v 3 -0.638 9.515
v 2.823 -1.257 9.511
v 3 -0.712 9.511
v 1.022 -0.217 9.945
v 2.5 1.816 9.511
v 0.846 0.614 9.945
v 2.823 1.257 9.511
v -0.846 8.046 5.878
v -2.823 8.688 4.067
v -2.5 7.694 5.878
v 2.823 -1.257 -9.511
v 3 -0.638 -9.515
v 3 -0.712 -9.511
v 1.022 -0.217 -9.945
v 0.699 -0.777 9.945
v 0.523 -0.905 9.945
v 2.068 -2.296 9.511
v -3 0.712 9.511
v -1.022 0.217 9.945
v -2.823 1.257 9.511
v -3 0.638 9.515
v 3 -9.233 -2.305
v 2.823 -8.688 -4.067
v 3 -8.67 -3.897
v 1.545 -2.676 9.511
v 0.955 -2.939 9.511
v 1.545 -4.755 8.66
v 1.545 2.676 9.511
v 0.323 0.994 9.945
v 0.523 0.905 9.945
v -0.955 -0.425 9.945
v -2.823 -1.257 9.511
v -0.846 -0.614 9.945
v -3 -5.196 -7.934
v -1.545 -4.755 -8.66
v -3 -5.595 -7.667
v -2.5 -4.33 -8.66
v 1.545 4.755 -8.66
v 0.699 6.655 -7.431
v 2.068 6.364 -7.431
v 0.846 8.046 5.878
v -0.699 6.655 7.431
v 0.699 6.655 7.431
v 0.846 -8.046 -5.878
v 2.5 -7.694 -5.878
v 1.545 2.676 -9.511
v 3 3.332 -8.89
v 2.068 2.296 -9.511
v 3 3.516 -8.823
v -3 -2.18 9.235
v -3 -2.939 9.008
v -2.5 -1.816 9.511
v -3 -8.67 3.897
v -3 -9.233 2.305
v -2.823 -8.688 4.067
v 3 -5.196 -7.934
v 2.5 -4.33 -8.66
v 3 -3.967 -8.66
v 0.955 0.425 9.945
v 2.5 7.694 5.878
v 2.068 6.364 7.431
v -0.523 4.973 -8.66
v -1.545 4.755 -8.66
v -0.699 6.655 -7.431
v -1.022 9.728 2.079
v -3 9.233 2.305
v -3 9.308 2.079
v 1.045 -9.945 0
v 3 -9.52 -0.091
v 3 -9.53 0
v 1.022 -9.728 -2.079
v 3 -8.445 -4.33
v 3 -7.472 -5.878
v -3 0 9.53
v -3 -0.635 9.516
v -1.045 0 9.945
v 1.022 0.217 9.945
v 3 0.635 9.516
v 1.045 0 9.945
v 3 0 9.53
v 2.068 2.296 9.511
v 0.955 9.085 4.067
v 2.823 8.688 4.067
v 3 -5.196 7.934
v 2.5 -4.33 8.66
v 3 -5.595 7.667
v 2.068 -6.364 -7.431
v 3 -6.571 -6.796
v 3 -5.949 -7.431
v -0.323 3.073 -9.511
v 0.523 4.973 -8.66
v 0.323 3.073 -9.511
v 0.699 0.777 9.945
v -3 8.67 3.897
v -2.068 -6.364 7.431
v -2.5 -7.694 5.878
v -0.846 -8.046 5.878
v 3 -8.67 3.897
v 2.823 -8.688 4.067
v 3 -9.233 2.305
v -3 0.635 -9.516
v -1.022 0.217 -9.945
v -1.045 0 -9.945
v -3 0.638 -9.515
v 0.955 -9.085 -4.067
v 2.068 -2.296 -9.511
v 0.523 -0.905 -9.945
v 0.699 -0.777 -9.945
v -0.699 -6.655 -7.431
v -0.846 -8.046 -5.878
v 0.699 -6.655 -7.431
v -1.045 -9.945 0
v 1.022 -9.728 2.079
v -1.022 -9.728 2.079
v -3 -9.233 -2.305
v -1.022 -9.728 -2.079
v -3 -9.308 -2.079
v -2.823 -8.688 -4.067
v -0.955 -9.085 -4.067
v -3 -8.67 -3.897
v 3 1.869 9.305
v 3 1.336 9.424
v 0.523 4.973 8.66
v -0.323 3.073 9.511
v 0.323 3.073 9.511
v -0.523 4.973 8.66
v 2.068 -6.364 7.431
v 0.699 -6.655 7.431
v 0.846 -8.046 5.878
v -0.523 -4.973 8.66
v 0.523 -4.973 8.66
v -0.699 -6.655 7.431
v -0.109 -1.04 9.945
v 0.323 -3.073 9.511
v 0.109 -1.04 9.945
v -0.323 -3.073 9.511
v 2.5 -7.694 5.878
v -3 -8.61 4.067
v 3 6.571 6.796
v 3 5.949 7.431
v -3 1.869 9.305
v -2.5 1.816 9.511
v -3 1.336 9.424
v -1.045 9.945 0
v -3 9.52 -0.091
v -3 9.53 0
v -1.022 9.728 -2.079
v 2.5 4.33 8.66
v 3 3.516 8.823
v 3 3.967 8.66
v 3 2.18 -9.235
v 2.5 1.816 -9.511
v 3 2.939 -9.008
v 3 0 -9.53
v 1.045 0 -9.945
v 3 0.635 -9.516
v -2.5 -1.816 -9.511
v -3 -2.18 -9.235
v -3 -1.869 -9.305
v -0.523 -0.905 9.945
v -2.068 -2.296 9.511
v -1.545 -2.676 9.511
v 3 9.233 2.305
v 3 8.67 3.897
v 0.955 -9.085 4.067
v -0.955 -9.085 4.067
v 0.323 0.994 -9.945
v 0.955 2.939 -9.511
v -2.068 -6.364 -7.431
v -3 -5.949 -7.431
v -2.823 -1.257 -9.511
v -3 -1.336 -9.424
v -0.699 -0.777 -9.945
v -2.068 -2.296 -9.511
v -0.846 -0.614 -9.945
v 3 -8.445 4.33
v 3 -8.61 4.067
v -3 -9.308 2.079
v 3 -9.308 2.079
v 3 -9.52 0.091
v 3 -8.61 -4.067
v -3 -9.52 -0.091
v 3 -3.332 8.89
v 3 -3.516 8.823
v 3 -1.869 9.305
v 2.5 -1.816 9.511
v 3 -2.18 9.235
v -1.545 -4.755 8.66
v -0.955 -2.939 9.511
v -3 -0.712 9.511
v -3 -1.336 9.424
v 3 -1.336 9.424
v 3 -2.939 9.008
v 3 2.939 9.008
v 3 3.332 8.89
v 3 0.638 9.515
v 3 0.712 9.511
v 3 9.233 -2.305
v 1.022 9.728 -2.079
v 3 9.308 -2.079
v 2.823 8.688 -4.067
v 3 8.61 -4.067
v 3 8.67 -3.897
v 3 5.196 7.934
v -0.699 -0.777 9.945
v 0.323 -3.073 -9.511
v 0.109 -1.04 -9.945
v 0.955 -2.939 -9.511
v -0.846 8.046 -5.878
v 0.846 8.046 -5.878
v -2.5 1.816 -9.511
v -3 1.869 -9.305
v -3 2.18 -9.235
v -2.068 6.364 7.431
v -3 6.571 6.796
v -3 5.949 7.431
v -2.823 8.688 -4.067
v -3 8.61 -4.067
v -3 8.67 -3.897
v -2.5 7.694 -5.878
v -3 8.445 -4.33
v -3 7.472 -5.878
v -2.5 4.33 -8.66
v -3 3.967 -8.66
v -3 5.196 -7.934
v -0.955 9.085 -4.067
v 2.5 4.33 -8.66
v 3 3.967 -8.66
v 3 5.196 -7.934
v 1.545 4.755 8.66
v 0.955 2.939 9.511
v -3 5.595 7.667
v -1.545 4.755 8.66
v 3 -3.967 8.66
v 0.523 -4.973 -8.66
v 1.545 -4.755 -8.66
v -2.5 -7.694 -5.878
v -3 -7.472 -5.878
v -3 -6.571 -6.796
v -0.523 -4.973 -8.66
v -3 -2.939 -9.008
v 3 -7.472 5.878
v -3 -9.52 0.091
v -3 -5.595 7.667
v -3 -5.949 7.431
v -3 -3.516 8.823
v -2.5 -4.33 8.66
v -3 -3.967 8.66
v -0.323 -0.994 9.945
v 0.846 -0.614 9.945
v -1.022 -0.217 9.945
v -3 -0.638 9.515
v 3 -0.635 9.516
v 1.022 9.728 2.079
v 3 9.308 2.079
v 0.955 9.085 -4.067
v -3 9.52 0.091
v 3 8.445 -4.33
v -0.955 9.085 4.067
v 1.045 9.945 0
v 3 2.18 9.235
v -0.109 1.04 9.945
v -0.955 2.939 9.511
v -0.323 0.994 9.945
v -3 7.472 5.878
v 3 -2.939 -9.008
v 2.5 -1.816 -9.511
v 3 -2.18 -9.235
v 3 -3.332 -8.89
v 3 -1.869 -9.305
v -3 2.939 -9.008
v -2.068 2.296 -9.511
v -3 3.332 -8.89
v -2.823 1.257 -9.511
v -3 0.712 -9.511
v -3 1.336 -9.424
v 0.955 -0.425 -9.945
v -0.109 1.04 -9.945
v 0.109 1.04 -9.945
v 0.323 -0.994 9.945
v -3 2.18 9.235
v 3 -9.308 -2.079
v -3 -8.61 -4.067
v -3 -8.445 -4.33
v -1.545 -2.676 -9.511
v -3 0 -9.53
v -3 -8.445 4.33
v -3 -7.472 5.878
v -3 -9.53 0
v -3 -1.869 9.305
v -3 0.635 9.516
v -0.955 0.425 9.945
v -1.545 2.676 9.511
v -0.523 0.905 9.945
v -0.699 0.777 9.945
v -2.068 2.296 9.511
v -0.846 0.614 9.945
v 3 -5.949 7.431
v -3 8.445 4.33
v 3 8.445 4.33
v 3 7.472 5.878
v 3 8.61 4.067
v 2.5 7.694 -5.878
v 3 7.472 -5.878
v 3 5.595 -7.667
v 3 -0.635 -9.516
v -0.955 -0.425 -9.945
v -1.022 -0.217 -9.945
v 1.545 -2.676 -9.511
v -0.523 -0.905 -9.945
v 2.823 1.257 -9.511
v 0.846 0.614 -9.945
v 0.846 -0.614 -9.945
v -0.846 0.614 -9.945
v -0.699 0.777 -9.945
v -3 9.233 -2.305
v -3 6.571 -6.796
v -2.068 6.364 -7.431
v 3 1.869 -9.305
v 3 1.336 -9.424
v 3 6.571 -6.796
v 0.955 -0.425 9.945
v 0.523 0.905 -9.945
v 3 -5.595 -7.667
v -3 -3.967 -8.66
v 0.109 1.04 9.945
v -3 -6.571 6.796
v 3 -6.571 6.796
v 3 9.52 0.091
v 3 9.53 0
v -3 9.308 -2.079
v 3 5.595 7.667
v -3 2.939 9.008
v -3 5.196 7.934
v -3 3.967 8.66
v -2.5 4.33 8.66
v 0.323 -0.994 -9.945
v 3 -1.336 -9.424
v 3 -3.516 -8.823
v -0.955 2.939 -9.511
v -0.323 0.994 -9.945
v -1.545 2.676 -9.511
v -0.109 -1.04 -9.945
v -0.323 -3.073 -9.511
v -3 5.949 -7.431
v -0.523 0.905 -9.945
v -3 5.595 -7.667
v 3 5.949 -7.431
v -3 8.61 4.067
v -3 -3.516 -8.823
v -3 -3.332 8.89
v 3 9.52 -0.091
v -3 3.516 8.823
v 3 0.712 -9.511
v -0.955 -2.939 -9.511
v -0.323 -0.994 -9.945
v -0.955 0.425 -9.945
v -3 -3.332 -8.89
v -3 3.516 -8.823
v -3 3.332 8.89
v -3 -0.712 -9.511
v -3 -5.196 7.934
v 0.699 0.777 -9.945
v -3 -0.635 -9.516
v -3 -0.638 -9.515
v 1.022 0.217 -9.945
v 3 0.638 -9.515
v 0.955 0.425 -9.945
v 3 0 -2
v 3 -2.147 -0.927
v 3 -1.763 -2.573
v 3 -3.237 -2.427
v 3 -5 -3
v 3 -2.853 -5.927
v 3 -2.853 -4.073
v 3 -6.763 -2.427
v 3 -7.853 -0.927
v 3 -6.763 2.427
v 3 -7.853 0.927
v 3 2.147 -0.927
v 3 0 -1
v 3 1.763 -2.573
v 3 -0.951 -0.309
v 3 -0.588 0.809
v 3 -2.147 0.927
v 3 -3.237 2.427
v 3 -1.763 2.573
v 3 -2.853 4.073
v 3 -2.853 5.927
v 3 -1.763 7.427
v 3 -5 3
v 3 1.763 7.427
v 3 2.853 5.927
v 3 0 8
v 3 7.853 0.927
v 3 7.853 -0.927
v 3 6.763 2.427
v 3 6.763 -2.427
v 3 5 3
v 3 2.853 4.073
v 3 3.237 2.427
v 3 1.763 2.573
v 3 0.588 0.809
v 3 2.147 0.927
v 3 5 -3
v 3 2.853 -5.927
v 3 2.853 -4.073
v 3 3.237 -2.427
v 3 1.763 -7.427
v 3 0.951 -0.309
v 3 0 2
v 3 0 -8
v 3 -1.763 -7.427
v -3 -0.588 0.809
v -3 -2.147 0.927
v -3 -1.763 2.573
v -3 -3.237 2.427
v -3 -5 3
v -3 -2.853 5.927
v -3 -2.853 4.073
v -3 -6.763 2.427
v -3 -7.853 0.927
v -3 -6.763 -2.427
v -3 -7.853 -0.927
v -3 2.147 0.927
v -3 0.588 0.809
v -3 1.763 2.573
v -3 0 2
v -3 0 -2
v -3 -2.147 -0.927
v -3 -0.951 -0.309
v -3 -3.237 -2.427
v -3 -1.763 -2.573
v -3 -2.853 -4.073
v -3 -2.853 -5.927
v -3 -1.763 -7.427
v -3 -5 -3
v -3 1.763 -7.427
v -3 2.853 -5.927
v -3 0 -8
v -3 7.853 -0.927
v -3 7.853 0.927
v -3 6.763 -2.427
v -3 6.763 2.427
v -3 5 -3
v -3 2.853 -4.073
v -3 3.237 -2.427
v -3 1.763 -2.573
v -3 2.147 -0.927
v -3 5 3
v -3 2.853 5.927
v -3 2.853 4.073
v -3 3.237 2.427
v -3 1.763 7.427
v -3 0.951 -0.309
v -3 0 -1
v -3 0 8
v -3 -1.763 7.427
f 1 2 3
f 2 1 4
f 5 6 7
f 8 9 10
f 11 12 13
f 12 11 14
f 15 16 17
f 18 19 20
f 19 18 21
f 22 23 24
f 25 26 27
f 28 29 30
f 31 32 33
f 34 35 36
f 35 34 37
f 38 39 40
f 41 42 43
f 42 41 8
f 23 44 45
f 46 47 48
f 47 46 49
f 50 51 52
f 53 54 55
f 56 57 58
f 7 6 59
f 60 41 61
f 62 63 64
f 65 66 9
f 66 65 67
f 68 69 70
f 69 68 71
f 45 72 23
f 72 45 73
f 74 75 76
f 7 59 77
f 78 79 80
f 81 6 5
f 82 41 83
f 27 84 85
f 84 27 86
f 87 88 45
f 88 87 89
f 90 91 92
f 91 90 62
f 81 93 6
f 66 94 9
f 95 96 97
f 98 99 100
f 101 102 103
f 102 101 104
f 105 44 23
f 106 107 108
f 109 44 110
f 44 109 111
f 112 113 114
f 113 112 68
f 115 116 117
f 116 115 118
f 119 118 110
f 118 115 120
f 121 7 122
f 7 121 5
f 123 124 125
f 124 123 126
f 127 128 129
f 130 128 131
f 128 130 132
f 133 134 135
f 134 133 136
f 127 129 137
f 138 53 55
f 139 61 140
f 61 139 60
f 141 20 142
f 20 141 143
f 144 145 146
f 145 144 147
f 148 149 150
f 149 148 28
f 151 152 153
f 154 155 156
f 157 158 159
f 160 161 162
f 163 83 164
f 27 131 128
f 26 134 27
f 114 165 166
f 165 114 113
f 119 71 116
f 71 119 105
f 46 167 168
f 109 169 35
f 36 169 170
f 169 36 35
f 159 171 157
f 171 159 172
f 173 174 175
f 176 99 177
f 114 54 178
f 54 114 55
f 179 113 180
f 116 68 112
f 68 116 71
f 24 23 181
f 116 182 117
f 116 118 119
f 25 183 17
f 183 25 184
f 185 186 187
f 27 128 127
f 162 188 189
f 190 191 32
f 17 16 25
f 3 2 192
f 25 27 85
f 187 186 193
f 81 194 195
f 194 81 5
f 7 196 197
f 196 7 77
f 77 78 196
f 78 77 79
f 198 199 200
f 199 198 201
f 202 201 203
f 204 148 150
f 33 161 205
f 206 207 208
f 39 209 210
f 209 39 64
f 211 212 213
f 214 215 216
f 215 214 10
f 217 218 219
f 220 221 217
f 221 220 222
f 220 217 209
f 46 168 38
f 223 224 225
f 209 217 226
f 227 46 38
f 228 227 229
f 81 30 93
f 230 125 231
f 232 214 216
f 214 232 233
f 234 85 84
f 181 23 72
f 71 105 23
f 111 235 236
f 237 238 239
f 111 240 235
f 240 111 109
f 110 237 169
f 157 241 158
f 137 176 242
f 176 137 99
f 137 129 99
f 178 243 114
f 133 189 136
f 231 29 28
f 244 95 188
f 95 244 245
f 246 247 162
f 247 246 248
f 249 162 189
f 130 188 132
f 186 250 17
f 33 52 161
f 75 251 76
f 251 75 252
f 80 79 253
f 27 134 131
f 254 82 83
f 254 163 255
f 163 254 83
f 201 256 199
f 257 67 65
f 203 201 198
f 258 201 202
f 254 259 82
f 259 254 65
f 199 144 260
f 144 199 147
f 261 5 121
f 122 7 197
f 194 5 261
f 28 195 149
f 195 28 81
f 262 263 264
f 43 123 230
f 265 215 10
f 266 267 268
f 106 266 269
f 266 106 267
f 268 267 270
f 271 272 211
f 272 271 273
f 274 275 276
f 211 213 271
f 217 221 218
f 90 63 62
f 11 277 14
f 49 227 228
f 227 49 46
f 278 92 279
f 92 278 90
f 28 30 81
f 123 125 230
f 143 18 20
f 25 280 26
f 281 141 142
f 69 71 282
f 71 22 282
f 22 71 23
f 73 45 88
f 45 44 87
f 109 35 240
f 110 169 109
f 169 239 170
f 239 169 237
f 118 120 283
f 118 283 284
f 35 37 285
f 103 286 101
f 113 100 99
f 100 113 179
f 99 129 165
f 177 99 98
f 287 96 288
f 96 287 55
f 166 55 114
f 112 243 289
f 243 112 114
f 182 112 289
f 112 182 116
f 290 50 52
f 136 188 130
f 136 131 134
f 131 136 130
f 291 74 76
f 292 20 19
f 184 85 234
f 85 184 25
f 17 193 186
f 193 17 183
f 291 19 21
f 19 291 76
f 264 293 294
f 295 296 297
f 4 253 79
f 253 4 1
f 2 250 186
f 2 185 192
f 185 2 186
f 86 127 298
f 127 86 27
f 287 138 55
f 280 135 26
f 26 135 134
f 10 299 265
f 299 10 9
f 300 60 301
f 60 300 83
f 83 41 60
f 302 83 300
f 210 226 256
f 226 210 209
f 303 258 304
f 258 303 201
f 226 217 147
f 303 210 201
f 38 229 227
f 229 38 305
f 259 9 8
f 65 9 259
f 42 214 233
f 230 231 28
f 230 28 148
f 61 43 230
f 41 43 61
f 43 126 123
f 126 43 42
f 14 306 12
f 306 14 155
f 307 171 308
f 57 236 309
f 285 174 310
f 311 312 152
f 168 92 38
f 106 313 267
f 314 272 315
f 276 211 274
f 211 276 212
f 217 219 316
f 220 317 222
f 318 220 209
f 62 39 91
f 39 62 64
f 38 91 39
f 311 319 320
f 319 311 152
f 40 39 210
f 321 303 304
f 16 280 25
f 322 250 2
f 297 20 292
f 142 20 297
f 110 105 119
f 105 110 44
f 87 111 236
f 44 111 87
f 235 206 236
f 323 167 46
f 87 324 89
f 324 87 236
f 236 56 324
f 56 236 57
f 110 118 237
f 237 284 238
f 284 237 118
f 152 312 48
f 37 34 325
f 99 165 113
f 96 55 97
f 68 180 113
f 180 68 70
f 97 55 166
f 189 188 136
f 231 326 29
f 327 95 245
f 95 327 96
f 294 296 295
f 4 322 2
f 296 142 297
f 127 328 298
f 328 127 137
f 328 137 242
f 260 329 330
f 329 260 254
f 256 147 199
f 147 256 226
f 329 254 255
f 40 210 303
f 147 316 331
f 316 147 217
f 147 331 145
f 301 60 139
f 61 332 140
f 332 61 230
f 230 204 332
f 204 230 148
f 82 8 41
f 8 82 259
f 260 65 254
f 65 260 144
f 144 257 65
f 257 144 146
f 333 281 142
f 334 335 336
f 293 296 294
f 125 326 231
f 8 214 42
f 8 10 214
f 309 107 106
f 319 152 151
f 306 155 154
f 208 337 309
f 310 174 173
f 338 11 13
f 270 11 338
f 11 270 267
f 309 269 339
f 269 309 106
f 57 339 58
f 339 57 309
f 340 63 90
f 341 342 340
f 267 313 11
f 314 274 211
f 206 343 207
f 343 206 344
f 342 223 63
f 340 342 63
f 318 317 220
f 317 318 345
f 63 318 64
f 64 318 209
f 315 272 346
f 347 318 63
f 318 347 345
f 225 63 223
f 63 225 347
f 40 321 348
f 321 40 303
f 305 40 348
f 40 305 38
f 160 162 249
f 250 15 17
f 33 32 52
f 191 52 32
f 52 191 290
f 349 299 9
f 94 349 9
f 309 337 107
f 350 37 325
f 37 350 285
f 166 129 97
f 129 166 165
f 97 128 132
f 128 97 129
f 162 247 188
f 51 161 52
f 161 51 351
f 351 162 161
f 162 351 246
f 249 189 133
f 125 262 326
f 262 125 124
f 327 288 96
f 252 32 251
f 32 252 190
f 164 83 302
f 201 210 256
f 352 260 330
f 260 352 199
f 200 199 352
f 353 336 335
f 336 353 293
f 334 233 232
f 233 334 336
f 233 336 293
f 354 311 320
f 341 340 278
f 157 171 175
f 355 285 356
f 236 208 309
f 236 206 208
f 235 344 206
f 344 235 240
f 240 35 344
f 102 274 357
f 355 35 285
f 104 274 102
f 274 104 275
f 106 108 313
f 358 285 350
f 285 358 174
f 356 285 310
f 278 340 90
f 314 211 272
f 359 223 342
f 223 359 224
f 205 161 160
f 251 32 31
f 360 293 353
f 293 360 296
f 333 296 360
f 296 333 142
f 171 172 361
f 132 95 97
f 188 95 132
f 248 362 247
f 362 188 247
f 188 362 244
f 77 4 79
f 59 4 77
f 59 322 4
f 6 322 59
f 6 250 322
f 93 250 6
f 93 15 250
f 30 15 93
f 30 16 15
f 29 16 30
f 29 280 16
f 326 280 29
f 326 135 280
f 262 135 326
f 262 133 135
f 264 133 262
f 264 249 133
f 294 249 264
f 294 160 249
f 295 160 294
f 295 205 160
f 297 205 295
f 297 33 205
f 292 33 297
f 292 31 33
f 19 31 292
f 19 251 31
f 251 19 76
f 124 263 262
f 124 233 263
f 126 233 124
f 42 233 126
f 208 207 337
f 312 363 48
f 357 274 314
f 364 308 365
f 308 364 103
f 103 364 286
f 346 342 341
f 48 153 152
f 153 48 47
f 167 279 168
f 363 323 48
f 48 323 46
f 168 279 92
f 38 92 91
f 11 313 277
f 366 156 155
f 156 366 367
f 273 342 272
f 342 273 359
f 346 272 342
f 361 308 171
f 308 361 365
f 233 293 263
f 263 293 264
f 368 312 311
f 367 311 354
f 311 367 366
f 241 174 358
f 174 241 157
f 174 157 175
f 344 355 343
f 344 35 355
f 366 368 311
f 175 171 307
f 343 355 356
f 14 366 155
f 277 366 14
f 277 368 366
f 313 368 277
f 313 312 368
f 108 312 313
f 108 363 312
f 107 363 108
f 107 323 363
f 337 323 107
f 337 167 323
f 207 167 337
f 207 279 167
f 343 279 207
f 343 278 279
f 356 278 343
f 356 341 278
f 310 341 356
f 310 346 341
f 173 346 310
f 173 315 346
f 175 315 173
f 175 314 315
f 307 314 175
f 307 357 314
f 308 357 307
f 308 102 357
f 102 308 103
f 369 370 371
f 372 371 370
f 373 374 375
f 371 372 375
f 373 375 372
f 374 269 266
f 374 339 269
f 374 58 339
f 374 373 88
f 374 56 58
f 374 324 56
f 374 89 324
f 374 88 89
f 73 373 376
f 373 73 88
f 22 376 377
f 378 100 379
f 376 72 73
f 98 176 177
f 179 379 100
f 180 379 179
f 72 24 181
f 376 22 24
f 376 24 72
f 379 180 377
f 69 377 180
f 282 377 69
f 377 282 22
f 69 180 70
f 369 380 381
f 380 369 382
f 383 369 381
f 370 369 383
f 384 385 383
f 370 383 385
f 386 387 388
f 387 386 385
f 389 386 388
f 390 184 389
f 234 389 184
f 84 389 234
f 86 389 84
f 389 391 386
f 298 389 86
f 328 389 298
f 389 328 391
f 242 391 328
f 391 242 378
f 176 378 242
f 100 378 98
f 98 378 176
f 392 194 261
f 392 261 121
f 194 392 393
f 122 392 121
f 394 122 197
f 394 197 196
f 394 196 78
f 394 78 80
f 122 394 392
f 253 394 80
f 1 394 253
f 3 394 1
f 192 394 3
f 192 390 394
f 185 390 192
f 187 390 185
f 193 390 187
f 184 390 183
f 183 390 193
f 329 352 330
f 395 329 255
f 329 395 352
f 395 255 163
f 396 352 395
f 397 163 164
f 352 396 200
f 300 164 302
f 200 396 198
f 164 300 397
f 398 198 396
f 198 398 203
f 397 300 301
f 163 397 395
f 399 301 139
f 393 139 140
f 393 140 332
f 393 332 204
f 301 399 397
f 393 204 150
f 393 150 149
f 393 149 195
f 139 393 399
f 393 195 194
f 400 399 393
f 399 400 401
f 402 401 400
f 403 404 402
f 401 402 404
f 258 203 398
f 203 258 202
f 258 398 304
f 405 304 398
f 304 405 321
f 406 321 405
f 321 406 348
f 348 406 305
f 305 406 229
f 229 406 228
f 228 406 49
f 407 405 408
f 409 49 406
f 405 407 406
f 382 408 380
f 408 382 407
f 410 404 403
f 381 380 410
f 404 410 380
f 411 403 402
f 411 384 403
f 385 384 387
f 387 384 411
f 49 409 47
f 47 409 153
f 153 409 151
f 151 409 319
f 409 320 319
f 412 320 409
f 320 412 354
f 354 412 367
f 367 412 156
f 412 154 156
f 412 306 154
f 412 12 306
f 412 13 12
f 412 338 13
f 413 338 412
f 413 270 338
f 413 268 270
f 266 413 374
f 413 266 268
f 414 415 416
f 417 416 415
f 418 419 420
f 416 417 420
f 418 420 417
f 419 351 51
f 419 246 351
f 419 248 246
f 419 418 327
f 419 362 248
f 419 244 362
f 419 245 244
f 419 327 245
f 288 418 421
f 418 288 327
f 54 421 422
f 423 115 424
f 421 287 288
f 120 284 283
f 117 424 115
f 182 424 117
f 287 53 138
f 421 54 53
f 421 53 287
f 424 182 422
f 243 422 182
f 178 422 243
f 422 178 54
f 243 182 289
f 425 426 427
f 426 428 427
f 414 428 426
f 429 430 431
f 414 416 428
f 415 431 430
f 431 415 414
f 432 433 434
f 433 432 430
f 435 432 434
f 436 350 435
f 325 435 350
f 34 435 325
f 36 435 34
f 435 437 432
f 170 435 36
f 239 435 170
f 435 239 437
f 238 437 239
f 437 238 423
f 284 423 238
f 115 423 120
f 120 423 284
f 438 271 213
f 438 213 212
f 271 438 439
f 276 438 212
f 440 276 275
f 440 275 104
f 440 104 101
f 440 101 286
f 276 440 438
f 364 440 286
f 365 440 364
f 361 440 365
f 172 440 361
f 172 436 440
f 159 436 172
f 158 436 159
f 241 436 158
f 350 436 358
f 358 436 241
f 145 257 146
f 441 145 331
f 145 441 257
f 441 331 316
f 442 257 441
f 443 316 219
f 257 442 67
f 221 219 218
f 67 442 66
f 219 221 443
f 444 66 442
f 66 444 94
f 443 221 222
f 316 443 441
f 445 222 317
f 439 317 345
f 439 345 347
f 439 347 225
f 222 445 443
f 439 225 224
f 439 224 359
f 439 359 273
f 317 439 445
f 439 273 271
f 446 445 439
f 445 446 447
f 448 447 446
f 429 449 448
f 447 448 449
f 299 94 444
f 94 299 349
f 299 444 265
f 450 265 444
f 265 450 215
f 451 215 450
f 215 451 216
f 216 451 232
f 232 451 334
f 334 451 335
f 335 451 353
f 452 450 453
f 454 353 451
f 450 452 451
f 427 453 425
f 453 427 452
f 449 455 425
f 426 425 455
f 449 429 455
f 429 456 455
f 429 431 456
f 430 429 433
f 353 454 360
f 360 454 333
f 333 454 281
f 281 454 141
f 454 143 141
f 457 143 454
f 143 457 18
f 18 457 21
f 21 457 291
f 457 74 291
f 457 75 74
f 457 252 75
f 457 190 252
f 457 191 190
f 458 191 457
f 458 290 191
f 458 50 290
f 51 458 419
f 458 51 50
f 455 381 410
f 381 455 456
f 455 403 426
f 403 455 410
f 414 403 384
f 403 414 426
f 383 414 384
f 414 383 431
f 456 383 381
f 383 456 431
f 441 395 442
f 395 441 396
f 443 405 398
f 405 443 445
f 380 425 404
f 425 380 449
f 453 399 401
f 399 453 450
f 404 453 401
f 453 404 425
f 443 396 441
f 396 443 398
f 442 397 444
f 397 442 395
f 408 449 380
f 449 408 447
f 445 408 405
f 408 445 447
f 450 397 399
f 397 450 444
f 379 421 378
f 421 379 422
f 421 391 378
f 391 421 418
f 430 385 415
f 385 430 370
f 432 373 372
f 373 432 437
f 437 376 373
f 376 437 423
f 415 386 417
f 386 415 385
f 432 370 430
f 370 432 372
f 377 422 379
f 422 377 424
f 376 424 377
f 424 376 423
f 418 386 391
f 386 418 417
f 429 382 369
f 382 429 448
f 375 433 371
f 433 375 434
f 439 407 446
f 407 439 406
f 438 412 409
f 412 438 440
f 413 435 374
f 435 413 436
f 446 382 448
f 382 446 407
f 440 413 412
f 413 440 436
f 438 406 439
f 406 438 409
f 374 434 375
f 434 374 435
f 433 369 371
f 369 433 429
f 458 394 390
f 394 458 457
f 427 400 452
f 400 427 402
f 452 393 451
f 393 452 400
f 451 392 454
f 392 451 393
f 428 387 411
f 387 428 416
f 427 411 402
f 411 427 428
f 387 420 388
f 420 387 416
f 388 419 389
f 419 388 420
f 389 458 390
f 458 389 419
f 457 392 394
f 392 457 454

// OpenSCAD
// Wheel for U2 Model

// Copyright (C) 2014 Jeremy Bennett <jeremy@jeremybennett.com>

// Contributor: Jeremy Bennett <jeremy@jeremybennett.com>

// This file is licensed under the Creative Commons Attribution-ShareAlike 3.0
// Unported License. To view a copy of this license, visit
// http://creativecommons.org/licenses/by-sa/3.0/ or send a letter to Creative
// Commons, PO Box 1866, Mountain View, CA 94042, USA.

// 45678901234567890123456789012345678901234567890123456789012345678901234567890


difference() {
	intersection() {
   		     sphere(r = 10);
      		 cube(size = [6,200,300], center = true);
	}
	rotate ([0,90,0])
		translate([ 0, 0, -5])
			cylinder(h = 10, d=2);
	rotate ([0,90,0])
		translate([ 0, 5, -5])
			cylinder(h = 10, d=6);
	rotate ([0,90,0])
		translate([ 0, 5, -5])
			cylinder(h = 10, d=6);
	rotate ([0,90,0])
		translate([ 0, -5, -5])
			cylinder(h = 10, d=6);
	rotate ([0,90,0])
		translate([ 5, 0, -5])
			cylinder(h = 10, d=6);
	rotate ([0,90,0])
		translate([ -5, 0, -5])
			cylinder(h = 10, d=6);
	}
